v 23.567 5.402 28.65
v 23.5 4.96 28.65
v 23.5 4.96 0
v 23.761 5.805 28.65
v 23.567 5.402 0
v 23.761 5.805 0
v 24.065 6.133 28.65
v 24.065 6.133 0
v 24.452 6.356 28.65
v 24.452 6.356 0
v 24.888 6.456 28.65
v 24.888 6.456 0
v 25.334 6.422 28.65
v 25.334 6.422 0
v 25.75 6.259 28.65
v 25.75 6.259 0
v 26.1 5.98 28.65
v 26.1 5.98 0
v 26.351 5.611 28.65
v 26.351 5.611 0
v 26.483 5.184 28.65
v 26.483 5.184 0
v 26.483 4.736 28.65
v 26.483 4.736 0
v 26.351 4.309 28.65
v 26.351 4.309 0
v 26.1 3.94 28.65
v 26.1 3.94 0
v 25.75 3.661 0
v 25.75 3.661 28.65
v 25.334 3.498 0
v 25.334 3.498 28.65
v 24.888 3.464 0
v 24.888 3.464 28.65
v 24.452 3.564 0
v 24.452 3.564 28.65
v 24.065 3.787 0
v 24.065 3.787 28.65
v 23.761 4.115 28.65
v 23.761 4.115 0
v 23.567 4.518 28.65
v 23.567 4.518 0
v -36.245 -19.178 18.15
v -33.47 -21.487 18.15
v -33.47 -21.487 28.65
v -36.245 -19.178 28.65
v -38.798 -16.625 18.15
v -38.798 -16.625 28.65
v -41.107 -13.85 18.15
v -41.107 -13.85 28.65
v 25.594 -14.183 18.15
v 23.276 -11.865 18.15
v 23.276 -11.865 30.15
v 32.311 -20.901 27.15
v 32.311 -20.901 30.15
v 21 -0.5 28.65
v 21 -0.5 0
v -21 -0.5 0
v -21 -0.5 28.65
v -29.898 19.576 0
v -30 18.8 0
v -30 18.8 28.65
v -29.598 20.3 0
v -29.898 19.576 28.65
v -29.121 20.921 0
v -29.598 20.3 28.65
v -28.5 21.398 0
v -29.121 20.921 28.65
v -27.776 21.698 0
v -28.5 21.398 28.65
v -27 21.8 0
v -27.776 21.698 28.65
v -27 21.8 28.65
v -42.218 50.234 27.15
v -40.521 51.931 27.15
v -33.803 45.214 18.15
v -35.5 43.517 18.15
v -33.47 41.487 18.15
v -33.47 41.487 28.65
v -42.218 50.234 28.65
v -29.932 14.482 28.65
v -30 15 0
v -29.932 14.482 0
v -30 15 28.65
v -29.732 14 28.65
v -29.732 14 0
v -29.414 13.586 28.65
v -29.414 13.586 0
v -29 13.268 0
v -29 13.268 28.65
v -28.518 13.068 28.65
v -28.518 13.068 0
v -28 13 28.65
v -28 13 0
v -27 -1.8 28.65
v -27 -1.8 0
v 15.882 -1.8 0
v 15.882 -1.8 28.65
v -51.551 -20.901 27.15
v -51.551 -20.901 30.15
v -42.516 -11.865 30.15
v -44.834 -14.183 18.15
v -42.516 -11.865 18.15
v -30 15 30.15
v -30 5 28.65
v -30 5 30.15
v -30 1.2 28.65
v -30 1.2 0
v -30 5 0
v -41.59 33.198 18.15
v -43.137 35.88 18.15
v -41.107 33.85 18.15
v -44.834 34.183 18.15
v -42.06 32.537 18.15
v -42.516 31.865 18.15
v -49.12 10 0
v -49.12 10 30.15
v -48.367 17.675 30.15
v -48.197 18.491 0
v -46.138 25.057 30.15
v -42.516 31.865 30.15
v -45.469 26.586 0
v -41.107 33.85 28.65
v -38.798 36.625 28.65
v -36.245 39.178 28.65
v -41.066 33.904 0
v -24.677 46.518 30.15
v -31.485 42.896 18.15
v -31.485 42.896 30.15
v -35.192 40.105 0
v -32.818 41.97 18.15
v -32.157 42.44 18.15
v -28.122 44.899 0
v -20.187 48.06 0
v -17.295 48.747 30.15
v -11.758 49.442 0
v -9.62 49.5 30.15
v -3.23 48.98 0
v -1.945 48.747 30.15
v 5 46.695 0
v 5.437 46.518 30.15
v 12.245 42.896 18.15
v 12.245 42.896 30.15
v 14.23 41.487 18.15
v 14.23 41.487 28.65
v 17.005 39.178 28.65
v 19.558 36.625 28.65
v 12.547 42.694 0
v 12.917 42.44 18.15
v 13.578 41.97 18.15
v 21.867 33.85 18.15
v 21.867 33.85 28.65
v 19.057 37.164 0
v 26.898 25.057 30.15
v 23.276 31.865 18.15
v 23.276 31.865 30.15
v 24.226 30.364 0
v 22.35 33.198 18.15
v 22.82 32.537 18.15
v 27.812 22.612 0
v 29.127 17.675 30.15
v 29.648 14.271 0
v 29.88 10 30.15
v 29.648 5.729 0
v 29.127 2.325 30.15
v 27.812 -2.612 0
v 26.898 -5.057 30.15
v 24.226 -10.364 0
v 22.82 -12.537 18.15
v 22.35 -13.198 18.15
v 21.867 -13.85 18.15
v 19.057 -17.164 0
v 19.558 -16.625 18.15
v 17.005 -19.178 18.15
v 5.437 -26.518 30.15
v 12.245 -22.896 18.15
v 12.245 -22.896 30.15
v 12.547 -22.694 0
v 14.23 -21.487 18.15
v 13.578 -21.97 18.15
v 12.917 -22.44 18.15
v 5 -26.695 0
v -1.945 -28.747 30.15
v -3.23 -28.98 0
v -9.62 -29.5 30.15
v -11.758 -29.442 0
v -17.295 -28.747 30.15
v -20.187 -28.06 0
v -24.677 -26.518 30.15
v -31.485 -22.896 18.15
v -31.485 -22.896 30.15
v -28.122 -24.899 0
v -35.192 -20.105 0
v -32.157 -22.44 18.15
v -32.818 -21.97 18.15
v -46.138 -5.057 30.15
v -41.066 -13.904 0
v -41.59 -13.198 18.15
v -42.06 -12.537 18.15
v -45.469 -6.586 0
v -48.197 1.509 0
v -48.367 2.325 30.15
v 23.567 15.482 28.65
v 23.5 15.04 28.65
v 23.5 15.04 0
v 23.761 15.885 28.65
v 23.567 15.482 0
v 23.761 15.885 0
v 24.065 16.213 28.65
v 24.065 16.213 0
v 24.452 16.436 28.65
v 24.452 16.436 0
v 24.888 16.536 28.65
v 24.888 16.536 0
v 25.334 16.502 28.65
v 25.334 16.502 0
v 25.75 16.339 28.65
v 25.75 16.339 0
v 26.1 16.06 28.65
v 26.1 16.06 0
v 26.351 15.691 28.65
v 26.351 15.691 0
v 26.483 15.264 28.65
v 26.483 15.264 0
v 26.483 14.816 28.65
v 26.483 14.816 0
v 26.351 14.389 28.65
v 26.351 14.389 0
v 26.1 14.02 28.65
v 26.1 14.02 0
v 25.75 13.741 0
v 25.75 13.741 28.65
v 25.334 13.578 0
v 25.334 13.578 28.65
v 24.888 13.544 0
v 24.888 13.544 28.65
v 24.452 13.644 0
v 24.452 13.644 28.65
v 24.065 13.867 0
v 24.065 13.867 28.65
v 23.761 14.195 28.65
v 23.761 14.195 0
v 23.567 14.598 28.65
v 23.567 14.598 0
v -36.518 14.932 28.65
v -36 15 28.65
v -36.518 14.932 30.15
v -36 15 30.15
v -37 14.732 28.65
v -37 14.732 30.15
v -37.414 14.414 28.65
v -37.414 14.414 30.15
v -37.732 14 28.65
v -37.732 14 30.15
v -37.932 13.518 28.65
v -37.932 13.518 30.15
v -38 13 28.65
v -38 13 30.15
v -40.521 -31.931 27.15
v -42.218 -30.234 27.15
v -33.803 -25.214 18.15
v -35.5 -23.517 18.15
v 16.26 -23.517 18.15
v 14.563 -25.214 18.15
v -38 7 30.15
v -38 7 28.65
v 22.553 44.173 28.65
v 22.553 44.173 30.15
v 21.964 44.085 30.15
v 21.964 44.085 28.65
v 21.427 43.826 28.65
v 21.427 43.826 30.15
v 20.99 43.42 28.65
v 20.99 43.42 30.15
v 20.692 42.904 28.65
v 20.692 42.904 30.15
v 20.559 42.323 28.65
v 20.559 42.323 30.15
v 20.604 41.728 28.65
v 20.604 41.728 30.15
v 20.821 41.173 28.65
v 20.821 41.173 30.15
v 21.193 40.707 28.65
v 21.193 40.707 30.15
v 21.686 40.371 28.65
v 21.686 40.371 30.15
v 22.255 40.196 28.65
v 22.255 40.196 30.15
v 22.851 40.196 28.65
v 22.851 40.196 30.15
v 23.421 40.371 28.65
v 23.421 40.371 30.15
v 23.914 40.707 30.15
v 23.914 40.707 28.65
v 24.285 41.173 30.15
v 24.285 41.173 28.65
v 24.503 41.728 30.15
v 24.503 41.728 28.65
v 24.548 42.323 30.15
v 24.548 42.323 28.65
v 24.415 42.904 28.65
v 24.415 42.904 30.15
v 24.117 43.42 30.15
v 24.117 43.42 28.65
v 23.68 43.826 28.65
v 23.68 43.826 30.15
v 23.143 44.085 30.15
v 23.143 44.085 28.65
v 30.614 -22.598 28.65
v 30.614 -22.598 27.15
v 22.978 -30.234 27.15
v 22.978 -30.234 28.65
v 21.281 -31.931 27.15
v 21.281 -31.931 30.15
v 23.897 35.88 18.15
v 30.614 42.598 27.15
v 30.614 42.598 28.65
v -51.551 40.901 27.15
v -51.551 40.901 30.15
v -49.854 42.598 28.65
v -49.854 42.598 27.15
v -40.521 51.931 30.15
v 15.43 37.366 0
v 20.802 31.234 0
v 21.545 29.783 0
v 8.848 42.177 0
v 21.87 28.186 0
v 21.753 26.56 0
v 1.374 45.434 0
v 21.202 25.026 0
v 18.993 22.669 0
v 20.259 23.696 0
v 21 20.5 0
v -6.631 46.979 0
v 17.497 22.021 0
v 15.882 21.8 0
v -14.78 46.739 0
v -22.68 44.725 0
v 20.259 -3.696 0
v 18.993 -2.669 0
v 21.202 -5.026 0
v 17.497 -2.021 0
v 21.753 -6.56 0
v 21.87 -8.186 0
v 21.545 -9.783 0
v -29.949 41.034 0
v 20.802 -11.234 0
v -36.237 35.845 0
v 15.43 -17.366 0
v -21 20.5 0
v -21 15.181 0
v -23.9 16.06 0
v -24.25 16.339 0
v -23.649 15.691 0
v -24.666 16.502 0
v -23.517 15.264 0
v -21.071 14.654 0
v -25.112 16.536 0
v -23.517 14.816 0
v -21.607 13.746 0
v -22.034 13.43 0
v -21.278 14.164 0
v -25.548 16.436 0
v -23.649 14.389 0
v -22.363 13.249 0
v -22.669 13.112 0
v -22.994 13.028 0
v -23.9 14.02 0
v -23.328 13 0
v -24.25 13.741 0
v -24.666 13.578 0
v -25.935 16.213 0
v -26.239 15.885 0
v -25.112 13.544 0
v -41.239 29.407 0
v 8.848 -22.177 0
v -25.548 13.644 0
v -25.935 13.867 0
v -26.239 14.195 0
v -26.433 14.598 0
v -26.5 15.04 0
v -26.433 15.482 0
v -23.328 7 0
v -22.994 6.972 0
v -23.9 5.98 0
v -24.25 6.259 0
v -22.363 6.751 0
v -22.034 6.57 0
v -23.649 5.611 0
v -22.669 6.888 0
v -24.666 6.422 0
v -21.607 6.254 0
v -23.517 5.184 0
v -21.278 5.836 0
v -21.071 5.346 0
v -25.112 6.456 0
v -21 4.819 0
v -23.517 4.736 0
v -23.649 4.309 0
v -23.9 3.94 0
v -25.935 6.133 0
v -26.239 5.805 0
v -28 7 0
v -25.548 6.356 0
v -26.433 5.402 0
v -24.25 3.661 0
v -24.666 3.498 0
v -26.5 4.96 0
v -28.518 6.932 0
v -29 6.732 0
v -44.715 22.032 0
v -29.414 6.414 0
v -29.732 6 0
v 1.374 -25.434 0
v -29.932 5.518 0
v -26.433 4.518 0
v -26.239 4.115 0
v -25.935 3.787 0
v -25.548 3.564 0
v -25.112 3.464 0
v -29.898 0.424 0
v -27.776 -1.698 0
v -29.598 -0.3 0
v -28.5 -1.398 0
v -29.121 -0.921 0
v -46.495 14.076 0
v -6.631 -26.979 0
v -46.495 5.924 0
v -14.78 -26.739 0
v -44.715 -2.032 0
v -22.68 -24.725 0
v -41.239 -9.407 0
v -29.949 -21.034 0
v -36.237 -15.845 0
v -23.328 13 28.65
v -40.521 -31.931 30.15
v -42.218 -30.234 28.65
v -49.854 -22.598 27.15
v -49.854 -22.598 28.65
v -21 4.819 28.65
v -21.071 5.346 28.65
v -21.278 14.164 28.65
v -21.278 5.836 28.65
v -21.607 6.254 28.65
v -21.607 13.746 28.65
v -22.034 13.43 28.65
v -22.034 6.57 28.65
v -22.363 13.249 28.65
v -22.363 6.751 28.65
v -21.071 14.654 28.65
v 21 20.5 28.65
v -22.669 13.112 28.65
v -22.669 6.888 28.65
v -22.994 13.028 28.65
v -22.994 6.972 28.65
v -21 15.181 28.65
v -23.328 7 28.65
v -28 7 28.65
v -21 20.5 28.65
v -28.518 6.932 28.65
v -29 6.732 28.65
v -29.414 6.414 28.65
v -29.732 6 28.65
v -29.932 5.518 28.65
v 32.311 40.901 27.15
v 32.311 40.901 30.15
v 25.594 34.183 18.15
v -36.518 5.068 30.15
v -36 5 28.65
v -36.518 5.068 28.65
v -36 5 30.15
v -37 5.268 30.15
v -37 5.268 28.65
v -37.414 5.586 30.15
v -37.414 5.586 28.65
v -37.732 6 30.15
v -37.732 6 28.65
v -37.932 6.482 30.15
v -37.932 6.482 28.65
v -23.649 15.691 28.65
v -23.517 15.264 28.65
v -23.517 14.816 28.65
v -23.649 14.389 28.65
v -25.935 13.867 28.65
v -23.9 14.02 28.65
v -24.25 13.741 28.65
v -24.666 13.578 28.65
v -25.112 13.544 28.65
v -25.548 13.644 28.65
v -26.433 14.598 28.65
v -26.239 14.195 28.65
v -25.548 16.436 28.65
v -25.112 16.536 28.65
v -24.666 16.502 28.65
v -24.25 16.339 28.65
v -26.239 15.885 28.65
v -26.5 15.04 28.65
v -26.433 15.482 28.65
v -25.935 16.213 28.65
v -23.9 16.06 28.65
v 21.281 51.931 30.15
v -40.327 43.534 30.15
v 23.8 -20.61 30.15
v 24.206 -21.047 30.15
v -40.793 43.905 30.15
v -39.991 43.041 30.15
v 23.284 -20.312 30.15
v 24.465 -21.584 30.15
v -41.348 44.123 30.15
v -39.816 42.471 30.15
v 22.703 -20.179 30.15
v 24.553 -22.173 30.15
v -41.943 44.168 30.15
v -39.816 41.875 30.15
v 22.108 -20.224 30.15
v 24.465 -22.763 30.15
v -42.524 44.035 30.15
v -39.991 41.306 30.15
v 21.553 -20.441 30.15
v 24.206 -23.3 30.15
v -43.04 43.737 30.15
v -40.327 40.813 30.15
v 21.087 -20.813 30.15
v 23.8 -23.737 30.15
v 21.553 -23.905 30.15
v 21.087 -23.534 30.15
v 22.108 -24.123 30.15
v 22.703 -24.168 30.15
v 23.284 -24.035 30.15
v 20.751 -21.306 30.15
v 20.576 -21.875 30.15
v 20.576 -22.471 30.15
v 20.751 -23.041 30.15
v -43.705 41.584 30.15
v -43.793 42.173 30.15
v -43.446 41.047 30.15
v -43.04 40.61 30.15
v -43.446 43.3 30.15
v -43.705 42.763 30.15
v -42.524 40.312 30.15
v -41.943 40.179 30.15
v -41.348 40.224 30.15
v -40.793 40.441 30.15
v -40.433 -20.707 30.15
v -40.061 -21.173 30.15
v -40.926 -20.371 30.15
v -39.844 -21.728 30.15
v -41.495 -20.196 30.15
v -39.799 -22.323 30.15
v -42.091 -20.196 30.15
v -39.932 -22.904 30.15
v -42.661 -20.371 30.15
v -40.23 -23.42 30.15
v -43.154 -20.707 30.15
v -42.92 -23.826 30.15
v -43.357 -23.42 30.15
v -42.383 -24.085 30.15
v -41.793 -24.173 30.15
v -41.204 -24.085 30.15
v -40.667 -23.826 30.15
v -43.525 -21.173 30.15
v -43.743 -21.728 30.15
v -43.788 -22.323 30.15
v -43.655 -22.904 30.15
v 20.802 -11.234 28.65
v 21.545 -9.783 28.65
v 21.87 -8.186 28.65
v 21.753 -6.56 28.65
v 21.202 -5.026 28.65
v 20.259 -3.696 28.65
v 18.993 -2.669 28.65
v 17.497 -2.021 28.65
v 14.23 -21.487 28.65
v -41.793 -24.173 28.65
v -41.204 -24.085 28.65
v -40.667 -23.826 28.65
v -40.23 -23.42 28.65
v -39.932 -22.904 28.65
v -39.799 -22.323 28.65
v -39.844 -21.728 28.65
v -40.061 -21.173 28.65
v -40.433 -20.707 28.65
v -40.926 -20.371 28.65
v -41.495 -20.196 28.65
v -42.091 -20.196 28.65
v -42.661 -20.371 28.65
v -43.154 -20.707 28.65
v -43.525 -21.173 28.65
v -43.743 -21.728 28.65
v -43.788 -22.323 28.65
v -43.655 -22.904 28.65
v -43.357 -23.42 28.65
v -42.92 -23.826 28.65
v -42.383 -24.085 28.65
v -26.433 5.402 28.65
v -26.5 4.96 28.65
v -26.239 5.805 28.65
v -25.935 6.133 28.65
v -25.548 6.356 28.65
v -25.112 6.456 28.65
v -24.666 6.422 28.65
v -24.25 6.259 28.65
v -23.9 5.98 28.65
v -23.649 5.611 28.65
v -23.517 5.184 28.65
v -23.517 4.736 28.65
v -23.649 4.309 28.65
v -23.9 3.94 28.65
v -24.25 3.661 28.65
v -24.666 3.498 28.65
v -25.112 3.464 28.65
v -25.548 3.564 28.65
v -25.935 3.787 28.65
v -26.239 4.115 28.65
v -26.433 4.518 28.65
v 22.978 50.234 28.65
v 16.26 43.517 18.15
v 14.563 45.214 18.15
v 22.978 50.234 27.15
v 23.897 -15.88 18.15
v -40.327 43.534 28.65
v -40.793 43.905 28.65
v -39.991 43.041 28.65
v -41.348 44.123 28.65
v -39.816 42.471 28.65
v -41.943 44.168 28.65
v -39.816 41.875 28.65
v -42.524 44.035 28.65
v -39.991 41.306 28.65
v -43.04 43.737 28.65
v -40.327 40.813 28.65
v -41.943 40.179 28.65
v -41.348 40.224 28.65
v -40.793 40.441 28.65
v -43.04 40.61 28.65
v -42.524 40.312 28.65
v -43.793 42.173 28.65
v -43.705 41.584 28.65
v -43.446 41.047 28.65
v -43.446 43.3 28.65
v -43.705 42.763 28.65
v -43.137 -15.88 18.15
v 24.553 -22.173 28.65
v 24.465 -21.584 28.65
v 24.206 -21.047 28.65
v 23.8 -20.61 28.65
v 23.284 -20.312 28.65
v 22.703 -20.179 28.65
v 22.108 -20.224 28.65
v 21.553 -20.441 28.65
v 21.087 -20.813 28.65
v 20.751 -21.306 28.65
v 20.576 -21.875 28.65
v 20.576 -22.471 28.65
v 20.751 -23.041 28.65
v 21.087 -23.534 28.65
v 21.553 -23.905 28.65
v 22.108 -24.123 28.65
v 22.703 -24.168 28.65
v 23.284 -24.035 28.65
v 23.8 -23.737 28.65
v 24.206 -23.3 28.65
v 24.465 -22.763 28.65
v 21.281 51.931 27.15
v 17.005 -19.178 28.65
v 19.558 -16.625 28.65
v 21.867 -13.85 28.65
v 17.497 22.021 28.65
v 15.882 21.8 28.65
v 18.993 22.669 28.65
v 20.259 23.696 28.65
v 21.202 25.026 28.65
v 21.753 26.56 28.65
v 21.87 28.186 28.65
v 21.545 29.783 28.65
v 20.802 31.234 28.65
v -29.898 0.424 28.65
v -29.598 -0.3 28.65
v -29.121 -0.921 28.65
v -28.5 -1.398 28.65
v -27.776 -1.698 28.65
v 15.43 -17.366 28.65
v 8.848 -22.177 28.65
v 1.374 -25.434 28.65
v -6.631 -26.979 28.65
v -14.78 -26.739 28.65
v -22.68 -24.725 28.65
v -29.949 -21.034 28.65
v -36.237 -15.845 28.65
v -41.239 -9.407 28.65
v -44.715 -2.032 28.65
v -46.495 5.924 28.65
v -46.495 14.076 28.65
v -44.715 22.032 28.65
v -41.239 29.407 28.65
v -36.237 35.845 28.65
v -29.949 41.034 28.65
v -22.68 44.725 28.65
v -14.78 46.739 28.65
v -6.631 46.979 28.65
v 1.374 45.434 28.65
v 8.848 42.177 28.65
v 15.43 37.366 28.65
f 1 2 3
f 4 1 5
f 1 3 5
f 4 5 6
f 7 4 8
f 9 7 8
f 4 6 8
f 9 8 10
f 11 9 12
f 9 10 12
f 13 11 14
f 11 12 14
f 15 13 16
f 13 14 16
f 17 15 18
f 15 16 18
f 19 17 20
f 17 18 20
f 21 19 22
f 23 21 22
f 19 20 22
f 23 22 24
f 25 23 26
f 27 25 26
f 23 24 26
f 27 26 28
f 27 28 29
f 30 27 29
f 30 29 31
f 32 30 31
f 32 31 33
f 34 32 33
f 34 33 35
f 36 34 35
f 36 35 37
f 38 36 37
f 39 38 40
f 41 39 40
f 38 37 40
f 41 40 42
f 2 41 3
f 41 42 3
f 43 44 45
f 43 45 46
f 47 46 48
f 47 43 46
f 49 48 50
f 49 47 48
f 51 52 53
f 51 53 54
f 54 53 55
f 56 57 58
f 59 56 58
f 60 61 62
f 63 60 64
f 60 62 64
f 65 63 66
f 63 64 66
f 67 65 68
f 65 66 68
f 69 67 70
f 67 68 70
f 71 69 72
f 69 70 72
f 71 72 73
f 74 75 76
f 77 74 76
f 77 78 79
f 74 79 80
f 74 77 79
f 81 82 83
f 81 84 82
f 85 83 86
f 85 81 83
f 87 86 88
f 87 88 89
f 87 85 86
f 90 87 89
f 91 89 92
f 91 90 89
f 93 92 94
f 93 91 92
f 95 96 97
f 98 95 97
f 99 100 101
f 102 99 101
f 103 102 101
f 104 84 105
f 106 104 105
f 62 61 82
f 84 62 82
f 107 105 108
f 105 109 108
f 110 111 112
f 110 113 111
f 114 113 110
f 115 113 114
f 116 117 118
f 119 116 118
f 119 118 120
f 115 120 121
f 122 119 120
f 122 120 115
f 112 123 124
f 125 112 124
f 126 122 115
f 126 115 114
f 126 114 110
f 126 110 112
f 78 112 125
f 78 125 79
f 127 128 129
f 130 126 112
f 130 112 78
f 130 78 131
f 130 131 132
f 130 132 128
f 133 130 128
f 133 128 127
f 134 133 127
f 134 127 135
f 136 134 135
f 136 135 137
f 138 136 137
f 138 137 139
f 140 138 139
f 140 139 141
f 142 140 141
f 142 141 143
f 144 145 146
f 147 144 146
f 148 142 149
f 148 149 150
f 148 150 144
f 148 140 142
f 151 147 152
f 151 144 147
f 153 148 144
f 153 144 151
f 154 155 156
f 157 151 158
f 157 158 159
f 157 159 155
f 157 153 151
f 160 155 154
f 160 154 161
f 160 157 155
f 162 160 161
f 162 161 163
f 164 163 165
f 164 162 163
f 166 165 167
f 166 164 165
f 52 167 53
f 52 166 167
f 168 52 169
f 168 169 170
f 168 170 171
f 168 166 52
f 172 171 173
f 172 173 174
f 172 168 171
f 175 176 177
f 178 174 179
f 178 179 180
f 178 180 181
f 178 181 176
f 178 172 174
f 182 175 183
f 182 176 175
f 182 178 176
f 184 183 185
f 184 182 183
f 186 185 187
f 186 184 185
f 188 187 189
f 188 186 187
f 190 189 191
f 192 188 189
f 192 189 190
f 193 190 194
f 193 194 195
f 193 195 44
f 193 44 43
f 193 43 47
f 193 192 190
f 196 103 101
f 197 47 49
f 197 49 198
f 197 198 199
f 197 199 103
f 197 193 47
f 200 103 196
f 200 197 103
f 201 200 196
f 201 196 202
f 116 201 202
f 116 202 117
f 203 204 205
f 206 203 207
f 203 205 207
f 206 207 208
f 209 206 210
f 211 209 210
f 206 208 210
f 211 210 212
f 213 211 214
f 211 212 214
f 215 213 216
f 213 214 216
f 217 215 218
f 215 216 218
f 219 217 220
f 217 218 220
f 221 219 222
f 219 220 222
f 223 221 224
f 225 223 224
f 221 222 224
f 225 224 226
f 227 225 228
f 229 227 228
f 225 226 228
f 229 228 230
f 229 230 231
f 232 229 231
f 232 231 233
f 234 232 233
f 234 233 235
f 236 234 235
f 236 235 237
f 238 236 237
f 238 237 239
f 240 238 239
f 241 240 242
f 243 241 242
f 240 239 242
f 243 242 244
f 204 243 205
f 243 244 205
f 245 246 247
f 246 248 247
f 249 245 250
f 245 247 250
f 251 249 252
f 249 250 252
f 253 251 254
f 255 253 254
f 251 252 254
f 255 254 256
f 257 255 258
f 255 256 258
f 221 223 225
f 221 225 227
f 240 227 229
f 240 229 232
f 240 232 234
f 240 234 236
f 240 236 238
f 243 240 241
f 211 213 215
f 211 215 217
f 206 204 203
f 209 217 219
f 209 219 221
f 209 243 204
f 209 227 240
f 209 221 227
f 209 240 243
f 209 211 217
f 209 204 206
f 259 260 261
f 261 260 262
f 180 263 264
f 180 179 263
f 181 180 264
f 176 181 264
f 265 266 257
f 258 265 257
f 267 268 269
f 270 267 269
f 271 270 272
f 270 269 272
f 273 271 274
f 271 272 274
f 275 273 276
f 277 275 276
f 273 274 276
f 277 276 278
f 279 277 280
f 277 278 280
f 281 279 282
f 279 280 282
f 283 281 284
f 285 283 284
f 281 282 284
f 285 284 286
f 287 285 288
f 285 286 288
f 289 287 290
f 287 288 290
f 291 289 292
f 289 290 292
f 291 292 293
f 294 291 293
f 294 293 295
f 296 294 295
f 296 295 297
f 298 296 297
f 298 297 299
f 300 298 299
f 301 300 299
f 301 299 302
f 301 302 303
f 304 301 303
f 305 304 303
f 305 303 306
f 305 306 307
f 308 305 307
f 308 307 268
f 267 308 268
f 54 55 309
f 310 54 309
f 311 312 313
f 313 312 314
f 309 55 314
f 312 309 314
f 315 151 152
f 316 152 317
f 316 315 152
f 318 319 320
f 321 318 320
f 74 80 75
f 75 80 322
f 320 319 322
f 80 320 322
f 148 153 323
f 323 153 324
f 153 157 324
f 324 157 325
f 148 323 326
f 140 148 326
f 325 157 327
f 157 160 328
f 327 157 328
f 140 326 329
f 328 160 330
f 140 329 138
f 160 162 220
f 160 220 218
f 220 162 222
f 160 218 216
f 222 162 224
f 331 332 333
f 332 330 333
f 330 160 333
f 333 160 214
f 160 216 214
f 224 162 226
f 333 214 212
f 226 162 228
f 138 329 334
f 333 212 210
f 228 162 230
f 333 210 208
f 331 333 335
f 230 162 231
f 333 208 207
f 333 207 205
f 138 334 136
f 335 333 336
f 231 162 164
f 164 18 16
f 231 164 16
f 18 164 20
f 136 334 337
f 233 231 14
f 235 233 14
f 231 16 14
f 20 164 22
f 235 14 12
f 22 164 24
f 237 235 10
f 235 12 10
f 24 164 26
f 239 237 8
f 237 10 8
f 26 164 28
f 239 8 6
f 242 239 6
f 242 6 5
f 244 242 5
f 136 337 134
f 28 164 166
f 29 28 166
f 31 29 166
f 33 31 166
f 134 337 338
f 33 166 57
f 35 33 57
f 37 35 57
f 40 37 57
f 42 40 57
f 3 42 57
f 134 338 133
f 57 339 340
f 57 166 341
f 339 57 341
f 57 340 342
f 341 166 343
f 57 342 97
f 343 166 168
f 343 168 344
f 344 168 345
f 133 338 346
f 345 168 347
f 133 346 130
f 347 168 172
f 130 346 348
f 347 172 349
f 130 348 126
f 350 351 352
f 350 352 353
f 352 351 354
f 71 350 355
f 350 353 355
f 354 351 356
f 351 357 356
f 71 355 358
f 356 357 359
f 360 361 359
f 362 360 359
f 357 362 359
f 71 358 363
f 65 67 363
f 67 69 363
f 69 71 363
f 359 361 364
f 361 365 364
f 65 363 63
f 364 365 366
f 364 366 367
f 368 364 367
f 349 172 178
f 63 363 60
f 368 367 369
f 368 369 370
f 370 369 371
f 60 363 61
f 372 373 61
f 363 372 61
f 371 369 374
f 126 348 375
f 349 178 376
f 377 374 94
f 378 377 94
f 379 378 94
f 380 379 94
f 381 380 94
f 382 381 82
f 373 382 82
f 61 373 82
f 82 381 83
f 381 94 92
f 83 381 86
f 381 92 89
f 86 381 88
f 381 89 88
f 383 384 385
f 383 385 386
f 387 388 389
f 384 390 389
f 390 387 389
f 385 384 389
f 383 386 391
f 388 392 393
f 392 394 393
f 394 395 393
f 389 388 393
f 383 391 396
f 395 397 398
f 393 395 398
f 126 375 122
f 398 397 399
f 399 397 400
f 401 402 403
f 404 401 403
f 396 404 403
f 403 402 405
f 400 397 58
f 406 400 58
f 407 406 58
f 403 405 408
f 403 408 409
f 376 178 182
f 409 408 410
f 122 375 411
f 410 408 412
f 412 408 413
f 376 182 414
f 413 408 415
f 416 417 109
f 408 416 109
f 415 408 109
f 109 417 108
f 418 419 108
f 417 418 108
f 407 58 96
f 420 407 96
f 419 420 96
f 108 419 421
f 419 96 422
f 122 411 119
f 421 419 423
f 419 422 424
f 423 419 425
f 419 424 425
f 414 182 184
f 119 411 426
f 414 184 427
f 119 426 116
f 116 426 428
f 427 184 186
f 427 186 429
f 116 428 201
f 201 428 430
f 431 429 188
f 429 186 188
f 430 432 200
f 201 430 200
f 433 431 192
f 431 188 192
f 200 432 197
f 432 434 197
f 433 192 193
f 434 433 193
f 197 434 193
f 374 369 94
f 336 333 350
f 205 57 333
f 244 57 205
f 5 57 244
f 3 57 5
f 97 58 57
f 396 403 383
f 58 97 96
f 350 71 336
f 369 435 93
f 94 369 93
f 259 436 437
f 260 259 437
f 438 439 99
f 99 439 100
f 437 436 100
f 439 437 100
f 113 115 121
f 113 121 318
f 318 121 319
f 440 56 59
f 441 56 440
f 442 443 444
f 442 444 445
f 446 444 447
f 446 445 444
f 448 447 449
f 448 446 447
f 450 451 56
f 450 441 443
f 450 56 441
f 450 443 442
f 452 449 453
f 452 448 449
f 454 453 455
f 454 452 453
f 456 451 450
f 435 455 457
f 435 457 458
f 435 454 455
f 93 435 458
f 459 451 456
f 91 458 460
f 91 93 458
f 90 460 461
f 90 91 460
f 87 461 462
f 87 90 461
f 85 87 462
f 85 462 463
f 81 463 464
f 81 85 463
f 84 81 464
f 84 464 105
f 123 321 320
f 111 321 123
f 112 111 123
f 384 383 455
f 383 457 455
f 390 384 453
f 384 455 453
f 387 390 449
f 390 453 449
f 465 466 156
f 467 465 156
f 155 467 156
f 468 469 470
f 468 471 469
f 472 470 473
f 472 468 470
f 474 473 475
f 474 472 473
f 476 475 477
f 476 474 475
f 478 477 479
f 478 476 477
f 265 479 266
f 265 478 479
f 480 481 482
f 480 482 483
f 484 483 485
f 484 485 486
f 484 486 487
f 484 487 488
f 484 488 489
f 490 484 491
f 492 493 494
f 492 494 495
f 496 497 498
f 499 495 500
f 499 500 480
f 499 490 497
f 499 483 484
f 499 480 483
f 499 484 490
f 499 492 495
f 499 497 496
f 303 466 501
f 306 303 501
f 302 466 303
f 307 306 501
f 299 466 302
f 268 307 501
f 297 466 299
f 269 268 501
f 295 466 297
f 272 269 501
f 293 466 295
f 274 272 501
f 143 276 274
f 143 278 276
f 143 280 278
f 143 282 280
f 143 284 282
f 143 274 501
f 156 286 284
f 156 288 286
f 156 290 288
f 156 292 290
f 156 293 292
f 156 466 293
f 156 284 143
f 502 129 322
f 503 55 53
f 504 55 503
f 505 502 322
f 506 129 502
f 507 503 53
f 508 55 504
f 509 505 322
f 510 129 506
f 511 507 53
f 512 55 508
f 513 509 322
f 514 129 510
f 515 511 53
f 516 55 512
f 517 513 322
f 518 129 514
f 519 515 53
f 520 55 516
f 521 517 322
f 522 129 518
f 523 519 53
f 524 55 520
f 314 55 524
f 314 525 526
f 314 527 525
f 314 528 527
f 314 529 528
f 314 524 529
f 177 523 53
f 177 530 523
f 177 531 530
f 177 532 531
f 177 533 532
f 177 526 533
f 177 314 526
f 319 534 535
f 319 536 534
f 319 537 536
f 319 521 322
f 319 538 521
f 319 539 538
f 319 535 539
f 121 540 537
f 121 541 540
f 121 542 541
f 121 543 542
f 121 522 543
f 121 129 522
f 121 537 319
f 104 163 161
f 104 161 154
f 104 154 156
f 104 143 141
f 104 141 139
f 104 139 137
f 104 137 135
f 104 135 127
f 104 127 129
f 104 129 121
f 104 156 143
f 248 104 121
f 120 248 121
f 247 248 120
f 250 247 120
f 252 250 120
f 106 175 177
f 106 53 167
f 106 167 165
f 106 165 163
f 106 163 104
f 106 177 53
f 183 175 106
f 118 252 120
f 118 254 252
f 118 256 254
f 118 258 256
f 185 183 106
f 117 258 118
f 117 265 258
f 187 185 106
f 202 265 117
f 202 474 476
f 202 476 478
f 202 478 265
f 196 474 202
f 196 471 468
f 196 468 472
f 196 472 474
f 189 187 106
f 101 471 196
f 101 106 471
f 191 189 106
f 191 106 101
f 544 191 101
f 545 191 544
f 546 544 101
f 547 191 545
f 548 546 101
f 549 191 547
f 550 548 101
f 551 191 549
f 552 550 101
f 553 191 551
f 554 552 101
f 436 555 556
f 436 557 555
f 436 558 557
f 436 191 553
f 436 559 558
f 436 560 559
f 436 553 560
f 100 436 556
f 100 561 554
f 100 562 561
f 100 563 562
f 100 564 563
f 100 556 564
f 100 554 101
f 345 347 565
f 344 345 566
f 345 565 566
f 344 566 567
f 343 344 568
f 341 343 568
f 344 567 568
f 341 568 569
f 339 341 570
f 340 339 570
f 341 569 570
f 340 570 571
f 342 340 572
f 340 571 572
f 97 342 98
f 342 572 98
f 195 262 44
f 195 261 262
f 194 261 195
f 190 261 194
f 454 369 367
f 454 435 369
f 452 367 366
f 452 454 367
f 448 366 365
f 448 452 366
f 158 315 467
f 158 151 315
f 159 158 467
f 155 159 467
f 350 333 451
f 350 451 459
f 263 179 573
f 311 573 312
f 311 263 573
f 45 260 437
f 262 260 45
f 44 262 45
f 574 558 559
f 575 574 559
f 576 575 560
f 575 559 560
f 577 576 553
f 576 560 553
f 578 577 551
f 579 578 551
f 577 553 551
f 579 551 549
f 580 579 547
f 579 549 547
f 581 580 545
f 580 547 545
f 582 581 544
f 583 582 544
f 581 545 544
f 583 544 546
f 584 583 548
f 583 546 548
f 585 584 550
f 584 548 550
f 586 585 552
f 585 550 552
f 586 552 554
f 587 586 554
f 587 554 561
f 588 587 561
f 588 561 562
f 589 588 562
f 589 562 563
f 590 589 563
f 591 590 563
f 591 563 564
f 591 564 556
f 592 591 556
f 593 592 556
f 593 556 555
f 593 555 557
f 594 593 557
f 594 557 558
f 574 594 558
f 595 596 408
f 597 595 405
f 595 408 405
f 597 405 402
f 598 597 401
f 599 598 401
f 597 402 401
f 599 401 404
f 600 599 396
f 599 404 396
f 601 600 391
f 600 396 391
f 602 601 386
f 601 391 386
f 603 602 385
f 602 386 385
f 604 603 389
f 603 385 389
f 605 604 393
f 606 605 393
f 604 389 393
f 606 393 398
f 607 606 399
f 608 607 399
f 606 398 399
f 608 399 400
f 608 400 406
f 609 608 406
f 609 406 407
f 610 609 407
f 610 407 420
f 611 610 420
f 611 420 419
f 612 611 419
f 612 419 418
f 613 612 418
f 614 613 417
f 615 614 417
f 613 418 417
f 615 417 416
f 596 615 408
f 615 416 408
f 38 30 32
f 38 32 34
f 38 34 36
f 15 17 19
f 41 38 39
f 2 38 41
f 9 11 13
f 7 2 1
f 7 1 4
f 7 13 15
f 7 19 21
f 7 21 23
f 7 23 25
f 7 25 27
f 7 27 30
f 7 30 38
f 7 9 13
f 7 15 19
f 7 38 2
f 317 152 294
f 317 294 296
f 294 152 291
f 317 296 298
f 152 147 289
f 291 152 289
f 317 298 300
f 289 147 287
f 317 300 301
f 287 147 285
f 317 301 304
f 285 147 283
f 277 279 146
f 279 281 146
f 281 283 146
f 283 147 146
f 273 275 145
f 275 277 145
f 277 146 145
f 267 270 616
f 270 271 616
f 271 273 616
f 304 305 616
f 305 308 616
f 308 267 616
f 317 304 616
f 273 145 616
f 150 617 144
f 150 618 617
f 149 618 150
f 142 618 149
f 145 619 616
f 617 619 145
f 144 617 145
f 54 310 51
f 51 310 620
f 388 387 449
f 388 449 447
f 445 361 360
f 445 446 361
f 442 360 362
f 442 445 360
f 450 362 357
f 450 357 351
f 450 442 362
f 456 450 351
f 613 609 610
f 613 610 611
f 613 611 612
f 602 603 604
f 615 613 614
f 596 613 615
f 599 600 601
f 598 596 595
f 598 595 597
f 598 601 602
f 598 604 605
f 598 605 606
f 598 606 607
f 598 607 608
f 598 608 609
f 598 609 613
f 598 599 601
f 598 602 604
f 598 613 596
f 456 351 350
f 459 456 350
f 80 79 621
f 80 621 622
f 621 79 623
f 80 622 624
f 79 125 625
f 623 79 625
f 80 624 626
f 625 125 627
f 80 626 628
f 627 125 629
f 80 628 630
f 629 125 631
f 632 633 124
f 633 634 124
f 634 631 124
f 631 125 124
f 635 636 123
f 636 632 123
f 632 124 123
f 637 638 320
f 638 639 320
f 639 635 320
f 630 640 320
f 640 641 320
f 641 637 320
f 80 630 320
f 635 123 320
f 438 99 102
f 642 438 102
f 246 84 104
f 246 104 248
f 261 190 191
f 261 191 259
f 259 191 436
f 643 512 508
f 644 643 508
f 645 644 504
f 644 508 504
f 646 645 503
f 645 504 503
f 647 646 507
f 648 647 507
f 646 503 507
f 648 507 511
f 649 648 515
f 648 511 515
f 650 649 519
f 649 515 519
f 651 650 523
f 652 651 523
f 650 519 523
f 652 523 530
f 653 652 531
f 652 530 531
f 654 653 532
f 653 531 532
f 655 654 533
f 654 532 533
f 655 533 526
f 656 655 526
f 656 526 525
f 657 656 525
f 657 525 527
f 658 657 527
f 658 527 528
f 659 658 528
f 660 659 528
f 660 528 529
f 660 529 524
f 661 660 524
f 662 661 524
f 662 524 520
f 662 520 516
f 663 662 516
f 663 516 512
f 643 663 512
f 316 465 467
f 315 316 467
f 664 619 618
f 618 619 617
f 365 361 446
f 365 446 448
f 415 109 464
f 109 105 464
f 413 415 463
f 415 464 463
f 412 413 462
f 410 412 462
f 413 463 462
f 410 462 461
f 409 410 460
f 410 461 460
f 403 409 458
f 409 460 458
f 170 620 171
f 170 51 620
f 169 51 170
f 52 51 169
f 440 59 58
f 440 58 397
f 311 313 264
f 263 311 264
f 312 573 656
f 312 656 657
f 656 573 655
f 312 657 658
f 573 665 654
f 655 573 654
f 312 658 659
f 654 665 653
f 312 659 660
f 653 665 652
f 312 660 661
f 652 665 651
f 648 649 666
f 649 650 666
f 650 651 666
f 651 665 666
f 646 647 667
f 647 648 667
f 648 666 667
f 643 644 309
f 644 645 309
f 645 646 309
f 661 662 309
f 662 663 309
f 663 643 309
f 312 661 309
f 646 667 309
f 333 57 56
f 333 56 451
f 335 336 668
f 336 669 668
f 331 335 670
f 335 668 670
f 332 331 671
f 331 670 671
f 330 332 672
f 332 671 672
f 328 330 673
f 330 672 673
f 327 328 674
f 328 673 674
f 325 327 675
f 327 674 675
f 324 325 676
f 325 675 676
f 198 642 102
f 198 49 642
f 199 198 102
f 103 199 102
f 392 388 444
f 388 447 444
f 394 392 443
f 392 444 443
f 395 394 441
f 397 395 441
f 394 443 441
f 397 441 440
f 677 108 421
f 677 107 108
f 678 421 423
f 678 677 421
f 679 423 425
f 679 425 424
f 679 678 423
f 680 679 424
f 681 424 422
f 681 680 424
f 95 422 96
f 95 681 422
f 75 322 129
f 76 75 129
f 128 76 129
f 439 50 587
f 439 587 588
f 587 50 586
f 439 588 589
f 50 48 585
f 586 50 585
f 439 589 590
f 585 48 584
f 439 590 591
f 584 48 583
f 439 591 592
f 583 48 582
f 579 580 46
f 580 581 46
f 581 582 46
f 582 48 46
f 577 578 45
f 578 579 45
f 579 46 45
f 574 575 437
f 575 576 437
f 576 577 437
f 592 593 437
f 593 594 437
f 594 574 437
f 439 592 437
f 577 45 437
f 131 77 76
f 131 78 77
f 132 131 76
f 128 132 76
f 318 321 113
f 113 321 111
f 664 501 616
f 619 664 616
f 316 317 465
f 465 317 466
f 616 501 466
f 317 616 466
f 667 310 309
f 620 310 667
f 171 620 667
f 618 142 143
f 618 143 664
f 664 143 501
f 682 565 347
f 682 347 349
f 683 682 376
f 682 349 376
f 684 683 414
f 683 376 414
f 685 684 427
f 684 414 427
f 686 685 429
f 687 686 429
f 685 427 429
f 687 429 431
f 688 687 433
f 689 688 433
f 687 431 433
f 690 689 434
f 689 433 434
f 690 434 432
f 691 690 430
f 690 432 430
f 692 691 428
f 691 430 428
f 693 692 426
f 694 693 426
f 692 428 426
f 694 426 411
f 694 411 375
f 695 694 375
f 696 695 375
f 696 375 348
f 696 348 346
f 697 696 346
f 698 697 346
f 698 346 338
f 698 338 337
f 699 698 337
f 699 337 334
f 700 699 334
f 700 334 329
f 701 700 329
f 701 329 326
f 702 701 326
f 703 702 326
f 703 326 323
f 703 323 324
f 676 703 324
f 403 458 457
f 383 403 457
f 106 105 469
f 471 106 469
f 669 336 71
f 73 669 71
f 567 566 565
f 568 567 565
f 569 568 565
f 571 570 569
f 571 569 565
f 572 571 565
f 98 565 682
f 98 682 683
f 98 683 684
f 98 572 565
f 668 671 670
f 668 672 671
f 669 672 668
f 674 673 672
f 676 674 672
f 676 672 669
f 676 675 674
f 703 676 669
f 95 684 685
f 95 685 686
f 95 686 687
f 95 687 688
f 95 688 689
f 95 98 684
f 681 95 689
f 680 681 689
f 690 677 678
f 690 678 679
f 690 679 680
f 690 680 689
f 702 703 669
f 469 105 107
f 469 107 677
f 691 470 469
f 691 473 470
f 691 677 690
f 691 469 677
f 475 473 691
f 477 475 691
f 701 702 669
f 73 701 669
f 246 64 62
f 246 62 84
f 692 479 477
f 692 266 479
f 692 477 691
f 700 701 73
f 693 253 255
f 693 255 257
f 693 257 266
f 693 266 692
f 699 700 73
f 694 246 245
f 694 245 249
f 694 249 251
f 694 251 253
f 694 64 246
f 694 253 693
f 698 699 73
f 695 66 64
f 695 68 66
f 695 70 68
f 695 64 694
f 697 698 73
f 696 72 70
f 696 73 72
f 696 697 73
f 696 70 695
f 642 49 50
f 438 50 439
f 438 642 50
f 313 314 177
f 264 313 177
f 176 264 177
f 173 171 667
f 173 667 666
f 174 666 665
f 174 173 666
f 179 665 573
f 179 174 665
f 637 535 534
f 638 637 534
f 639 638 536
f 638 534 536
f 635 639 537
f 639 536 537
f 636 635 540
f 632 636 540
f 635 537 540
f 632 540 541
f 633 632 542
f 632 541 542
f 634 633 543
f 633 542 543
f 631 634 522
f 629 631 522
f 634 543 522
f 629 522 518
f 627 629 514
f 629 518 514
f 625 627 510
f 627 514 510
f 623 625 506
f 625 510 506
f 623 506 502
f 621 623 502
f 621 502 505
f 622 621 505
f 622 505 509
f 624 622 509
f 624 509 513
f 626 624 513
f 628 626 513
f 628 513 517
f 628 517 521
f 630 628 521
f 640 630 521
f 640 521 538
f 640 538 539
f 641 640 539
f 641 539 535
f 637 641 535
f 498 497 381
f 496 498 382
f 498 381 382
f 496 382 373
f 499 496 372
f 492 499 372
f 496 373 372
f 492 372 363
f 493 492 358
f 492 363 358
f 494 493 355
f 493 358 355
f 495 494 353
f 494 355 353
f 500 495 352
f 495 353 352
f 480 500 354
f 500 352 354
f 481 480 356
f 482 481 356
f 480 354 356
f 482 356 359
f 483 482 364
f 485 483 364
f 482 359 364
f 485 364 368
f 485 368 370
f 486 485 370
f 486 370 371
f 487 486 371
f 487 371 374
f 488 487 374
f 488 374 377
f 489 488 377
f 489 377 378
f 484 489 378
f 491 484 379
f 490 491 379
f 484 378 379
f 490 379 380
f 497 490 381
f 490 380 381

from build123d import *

# Parameters (mm, degrees)
SKETCH1_R           = 39.5
BOSS_EXTRUDE1_DEPTH = 30.15
SKETCH3_W           = 42
SKETCH3_H           = 21
CUT_EXTRUDE1_DEPTH  = 28.65
CUT_EXTRUDE2_DEPTH  = 28.65
SKETCH5_R           = 1.5
CUT_EXTRUDE3_DEPTH  = 28.65
SKETCH8_W           = 8
SKETCH8_H           = 10
CUT_EXTRUDE5_DEPTH  = 76.391291937
FILLET1_R           = 3
FILLET3_R           = 6
FILLET2_R           = 2
SKETCH12_R          = 2
BOSS_EXTRUDE3_DEPTH = 12
CUT_EXTRUDE6_REACH  = 78.373
CUT_EXTRUDE7_DEPTH  = 10.5
CIRPATTERN19_COUNT  = 4


with BuildPart() as part:
    # Sketch1 → Boss-Extrude1 (new body)
    with BuildSketch(Plane.XY):
        with Locations(Location((-9.62, 10, 0), (0, 0, 180))):
            Circle(SKETCH1_R)
    extrude(amount=BOSS_EXTRUDE1_DEPTH)

    # Sketch3 → Cut-Extrude1 (cut)
    with BuildSketch(Plane(origin=(0, 0, 0), x_dir=(-1, 0, 0), z_dir=(0, 0, -1))):
        with Locations((0, 10)):
            Rectangle(SKETCH3_W, SKETCH3_H)
    extrude(amount=-CUT_EXTRUDE1_DEPTH, mode=Mode.SUBTRACT)

    # Sketch4 → Cut-Extrude2 (cut)
    with BuildSketch(Plane(origin=(0, 0, 0), x_dir=(-1, 0, 0), z_dir=(0, 0, -1))):
        with BuildLine():
            Line((30, -1.8), (-25.55342747, -1.8))
            ThreePointArc((-25.55342747, -1.8), (46.72, 10), (-25.55342747, 21.8))
            Line((-25.55342747, 21.8), (30, 21.8))
            Line((30, 21.8), (30, -1.8))
        make_face()
    extrude(amount=-CUT_EXTRUDE2_DEPTH, mode=Mode.SUBTRACT)

    # Sketch5 → Cut-Extrude3 (cut)
    with BuildSketch(Plane(origin=(0, 0, 0), x_dir=(-1, 0, 0), z_dir=(0, 0, -1))):
        with Locations((25, 4.96)):
            Circle(SKETCH5_R)
        with Locations((25, 15.04)):
            Circle(SKETCH5_R)
        with Locations((-25, 4.96)):
            Circle(SKETCH5_R)
        with Locations((-25, 15.04)):
            Circle(SKETCH5_R)
        Polygon((30, 7), (22.813409321, 7), (21, 6), (21, 7), (21, 13), (21, 14), (22.813409321, 13), (30, 13), align=None)
    extrude(amount=-CUT_EXTRUDE3_DEPTH, mode=Mode.SUBTRACT)

    # Sketch8 → Cut-Extrude5 (cut, through all)
    with BuildSketch(Plane(origin=(0, 0, 28.65), x_dir=(-1, 0, 0), z_dir=(0, 0, -1))):
        with Locations((34, 10)):
            Rectangle(SKETCH8_W, SKETCH8_H)
    extrude(amount=-CUT_EXTRUDE5_DEPTH, mode=Mode.SUBTRACT)

    # Fillet1
    fillet1_edges = [part.edges().sort_by_distance(p)[0] for p in [
        (-30, -1.8, 14.325),
        (-30, 21.8, 14.325),
    ]]
    fillet(fillet1_edges, radius=FILLET1_R)

    # Fillet3
    fillet3_edges = [part.edges().sort_by_distance(p)[0] for p in [
        (25.55342747, 21.8, 14.325),
        (25.55342747, -1.8, 14.325),
    ]]
    fillet(fillet3_edges, radius=FILLET3_R)

    # Fillet2
    fillet2_edges = [part.edges().sort_by_distance(p)[0] for p in [
        (-30, 13, 14.325),
        (-30, 7, 14.325),
        (-22.813409321, 7, 14.325),
        (-21, 6, 14.325),
        (-21, 14, 14.325),
        (-22.813409321, 13, 14.325),
        (-38, 15, 29.4),
        (-38, 5, 29.4),
    ]]
    fillet(fillet2_edges, radius=FILLET2_R)


with BuildPart() as body_2:
    # Sketch12 → Boss-Extrude3 (new body)
    with BuildSketch(Plane.XY.offset(30.15)):
        with BuildLine():
            Line((22.915425491, -11.504559705), (32.311432124, -20.900566338))
            Line((32.311432124, -20.900566338), (21.280566338, -31.931432124))
            Line((21.280566338, -31.931432124), (11.884559705, -22.535425491))
            ThreePointArc((11.884559705, -22.535425491), (17.957164466, -17.577164466), (22.915425491, -11.504559705))
        make_face()
        with Locations((22.553358544, -22.173358544)):
            Circle(SKETCH12_R, mode=Mode.SUBTRACT)
    extrude(amount=-BOSS_EXTRUDE3_DEPTH)

    # Cut-Extrude6: up to this face of the body (flat: up to its plane)
    cut_extrude6_end = Plane(body_2.part.faces().sort_by_distance((27.613428808, -16.202563021, 24.15))[0])
    # Sketch13 → Cut-Extrude6 (cut, up to the picked face)
    with BuildSketch(Plane(origin=(-5.325432893, -5.325432893, 0), x_dir=(0, 0, 1), z_dir=(-0.7071067811865415, -0.7071067811865537, 0)), mode=Mode.PRIVATE) as cut_extrude6_sk1:
        Polygon((18.15, -37.626564953), (27.15, -37.626564953), (18.15, -28.126564953), align=None)
    cut_extrude6_tool1 = split(extrude(cut_extrude6_sk1.sketch, amount=-CUT_EXTRUDE6_REACH, mode=Mode.PRIVATE), bisect_by=cut_extrude6_end, keep=Keep.BOTH, mode=Mode.PRIVATE)
    add(cut_extrude6_tool1.solids().sort_by(Axis((19.041395, -29.692261, 21.15), (0.7071067811865415, 0.7071067811865537, 0)))[0], mode=Mode.SUBTRACT)

    # Sketch14 → Cut-Extrude7 (cut)
    with BuildSketch(Plane(origin=(0, 0, 18.15), x_dir=(-1, 0, 0), z_dir=(0, 0, -1))):
        with BuildLine():
            Line((-14.230107258, -21.486860494), (-22.977622613, -30.23437585))
            Line((-22.977622613, -30.23437585), (-30.61437585, -22.597622613))
            Line((-30.61437585, -22.597622613), (-21.866860494, -13.850107258))
            ThreePointArc((-21.866860494, -13.850107258), (-18.310717857, -17.930717857), (-14.230107258, -21.486860494))
        make_face()
    extrude(amount=-CUT_EXTRUDE7_DEPTH, mode=Mode.SUBTRACT)


with BuildPart() as cirpattern19_1:
    # CirPattern19: pattern copy
    add(body_2.part.rotate(Axis((-9.62, 10, 0), (0, 0, 1)), 1 * 360 / CIRPATTERN19_COUNT))


with BuildPart() as cirpattern19_2:
    # CirPattern19: pattern copy
    add(body_2.part.rotate(Axis((-9.62, 10, 0), (0, 0, 1)), 2 * 360 / CIRPATTERN19_COUNT))


with BuildPart() as cirpattern19_3:
    # CirPattern19: pattern copy
    add(body_2.part.rotate(Axis((-9.62, 10, 0), (0, 0, 1)), 3 * 360 / CIRPATTERN19_COUNT))


with BuildPart() as part_1:
    add(part.part)

    # Combine1: union body 2, CirPattern19_3, CirPattern19_2, CirPattern19_1
    add(body_2.part)
    add(cirpattern19_3.part)
    add(cirpattern19_2.part)
    add(cirpattern19_1.part)


solid = part_1.part
